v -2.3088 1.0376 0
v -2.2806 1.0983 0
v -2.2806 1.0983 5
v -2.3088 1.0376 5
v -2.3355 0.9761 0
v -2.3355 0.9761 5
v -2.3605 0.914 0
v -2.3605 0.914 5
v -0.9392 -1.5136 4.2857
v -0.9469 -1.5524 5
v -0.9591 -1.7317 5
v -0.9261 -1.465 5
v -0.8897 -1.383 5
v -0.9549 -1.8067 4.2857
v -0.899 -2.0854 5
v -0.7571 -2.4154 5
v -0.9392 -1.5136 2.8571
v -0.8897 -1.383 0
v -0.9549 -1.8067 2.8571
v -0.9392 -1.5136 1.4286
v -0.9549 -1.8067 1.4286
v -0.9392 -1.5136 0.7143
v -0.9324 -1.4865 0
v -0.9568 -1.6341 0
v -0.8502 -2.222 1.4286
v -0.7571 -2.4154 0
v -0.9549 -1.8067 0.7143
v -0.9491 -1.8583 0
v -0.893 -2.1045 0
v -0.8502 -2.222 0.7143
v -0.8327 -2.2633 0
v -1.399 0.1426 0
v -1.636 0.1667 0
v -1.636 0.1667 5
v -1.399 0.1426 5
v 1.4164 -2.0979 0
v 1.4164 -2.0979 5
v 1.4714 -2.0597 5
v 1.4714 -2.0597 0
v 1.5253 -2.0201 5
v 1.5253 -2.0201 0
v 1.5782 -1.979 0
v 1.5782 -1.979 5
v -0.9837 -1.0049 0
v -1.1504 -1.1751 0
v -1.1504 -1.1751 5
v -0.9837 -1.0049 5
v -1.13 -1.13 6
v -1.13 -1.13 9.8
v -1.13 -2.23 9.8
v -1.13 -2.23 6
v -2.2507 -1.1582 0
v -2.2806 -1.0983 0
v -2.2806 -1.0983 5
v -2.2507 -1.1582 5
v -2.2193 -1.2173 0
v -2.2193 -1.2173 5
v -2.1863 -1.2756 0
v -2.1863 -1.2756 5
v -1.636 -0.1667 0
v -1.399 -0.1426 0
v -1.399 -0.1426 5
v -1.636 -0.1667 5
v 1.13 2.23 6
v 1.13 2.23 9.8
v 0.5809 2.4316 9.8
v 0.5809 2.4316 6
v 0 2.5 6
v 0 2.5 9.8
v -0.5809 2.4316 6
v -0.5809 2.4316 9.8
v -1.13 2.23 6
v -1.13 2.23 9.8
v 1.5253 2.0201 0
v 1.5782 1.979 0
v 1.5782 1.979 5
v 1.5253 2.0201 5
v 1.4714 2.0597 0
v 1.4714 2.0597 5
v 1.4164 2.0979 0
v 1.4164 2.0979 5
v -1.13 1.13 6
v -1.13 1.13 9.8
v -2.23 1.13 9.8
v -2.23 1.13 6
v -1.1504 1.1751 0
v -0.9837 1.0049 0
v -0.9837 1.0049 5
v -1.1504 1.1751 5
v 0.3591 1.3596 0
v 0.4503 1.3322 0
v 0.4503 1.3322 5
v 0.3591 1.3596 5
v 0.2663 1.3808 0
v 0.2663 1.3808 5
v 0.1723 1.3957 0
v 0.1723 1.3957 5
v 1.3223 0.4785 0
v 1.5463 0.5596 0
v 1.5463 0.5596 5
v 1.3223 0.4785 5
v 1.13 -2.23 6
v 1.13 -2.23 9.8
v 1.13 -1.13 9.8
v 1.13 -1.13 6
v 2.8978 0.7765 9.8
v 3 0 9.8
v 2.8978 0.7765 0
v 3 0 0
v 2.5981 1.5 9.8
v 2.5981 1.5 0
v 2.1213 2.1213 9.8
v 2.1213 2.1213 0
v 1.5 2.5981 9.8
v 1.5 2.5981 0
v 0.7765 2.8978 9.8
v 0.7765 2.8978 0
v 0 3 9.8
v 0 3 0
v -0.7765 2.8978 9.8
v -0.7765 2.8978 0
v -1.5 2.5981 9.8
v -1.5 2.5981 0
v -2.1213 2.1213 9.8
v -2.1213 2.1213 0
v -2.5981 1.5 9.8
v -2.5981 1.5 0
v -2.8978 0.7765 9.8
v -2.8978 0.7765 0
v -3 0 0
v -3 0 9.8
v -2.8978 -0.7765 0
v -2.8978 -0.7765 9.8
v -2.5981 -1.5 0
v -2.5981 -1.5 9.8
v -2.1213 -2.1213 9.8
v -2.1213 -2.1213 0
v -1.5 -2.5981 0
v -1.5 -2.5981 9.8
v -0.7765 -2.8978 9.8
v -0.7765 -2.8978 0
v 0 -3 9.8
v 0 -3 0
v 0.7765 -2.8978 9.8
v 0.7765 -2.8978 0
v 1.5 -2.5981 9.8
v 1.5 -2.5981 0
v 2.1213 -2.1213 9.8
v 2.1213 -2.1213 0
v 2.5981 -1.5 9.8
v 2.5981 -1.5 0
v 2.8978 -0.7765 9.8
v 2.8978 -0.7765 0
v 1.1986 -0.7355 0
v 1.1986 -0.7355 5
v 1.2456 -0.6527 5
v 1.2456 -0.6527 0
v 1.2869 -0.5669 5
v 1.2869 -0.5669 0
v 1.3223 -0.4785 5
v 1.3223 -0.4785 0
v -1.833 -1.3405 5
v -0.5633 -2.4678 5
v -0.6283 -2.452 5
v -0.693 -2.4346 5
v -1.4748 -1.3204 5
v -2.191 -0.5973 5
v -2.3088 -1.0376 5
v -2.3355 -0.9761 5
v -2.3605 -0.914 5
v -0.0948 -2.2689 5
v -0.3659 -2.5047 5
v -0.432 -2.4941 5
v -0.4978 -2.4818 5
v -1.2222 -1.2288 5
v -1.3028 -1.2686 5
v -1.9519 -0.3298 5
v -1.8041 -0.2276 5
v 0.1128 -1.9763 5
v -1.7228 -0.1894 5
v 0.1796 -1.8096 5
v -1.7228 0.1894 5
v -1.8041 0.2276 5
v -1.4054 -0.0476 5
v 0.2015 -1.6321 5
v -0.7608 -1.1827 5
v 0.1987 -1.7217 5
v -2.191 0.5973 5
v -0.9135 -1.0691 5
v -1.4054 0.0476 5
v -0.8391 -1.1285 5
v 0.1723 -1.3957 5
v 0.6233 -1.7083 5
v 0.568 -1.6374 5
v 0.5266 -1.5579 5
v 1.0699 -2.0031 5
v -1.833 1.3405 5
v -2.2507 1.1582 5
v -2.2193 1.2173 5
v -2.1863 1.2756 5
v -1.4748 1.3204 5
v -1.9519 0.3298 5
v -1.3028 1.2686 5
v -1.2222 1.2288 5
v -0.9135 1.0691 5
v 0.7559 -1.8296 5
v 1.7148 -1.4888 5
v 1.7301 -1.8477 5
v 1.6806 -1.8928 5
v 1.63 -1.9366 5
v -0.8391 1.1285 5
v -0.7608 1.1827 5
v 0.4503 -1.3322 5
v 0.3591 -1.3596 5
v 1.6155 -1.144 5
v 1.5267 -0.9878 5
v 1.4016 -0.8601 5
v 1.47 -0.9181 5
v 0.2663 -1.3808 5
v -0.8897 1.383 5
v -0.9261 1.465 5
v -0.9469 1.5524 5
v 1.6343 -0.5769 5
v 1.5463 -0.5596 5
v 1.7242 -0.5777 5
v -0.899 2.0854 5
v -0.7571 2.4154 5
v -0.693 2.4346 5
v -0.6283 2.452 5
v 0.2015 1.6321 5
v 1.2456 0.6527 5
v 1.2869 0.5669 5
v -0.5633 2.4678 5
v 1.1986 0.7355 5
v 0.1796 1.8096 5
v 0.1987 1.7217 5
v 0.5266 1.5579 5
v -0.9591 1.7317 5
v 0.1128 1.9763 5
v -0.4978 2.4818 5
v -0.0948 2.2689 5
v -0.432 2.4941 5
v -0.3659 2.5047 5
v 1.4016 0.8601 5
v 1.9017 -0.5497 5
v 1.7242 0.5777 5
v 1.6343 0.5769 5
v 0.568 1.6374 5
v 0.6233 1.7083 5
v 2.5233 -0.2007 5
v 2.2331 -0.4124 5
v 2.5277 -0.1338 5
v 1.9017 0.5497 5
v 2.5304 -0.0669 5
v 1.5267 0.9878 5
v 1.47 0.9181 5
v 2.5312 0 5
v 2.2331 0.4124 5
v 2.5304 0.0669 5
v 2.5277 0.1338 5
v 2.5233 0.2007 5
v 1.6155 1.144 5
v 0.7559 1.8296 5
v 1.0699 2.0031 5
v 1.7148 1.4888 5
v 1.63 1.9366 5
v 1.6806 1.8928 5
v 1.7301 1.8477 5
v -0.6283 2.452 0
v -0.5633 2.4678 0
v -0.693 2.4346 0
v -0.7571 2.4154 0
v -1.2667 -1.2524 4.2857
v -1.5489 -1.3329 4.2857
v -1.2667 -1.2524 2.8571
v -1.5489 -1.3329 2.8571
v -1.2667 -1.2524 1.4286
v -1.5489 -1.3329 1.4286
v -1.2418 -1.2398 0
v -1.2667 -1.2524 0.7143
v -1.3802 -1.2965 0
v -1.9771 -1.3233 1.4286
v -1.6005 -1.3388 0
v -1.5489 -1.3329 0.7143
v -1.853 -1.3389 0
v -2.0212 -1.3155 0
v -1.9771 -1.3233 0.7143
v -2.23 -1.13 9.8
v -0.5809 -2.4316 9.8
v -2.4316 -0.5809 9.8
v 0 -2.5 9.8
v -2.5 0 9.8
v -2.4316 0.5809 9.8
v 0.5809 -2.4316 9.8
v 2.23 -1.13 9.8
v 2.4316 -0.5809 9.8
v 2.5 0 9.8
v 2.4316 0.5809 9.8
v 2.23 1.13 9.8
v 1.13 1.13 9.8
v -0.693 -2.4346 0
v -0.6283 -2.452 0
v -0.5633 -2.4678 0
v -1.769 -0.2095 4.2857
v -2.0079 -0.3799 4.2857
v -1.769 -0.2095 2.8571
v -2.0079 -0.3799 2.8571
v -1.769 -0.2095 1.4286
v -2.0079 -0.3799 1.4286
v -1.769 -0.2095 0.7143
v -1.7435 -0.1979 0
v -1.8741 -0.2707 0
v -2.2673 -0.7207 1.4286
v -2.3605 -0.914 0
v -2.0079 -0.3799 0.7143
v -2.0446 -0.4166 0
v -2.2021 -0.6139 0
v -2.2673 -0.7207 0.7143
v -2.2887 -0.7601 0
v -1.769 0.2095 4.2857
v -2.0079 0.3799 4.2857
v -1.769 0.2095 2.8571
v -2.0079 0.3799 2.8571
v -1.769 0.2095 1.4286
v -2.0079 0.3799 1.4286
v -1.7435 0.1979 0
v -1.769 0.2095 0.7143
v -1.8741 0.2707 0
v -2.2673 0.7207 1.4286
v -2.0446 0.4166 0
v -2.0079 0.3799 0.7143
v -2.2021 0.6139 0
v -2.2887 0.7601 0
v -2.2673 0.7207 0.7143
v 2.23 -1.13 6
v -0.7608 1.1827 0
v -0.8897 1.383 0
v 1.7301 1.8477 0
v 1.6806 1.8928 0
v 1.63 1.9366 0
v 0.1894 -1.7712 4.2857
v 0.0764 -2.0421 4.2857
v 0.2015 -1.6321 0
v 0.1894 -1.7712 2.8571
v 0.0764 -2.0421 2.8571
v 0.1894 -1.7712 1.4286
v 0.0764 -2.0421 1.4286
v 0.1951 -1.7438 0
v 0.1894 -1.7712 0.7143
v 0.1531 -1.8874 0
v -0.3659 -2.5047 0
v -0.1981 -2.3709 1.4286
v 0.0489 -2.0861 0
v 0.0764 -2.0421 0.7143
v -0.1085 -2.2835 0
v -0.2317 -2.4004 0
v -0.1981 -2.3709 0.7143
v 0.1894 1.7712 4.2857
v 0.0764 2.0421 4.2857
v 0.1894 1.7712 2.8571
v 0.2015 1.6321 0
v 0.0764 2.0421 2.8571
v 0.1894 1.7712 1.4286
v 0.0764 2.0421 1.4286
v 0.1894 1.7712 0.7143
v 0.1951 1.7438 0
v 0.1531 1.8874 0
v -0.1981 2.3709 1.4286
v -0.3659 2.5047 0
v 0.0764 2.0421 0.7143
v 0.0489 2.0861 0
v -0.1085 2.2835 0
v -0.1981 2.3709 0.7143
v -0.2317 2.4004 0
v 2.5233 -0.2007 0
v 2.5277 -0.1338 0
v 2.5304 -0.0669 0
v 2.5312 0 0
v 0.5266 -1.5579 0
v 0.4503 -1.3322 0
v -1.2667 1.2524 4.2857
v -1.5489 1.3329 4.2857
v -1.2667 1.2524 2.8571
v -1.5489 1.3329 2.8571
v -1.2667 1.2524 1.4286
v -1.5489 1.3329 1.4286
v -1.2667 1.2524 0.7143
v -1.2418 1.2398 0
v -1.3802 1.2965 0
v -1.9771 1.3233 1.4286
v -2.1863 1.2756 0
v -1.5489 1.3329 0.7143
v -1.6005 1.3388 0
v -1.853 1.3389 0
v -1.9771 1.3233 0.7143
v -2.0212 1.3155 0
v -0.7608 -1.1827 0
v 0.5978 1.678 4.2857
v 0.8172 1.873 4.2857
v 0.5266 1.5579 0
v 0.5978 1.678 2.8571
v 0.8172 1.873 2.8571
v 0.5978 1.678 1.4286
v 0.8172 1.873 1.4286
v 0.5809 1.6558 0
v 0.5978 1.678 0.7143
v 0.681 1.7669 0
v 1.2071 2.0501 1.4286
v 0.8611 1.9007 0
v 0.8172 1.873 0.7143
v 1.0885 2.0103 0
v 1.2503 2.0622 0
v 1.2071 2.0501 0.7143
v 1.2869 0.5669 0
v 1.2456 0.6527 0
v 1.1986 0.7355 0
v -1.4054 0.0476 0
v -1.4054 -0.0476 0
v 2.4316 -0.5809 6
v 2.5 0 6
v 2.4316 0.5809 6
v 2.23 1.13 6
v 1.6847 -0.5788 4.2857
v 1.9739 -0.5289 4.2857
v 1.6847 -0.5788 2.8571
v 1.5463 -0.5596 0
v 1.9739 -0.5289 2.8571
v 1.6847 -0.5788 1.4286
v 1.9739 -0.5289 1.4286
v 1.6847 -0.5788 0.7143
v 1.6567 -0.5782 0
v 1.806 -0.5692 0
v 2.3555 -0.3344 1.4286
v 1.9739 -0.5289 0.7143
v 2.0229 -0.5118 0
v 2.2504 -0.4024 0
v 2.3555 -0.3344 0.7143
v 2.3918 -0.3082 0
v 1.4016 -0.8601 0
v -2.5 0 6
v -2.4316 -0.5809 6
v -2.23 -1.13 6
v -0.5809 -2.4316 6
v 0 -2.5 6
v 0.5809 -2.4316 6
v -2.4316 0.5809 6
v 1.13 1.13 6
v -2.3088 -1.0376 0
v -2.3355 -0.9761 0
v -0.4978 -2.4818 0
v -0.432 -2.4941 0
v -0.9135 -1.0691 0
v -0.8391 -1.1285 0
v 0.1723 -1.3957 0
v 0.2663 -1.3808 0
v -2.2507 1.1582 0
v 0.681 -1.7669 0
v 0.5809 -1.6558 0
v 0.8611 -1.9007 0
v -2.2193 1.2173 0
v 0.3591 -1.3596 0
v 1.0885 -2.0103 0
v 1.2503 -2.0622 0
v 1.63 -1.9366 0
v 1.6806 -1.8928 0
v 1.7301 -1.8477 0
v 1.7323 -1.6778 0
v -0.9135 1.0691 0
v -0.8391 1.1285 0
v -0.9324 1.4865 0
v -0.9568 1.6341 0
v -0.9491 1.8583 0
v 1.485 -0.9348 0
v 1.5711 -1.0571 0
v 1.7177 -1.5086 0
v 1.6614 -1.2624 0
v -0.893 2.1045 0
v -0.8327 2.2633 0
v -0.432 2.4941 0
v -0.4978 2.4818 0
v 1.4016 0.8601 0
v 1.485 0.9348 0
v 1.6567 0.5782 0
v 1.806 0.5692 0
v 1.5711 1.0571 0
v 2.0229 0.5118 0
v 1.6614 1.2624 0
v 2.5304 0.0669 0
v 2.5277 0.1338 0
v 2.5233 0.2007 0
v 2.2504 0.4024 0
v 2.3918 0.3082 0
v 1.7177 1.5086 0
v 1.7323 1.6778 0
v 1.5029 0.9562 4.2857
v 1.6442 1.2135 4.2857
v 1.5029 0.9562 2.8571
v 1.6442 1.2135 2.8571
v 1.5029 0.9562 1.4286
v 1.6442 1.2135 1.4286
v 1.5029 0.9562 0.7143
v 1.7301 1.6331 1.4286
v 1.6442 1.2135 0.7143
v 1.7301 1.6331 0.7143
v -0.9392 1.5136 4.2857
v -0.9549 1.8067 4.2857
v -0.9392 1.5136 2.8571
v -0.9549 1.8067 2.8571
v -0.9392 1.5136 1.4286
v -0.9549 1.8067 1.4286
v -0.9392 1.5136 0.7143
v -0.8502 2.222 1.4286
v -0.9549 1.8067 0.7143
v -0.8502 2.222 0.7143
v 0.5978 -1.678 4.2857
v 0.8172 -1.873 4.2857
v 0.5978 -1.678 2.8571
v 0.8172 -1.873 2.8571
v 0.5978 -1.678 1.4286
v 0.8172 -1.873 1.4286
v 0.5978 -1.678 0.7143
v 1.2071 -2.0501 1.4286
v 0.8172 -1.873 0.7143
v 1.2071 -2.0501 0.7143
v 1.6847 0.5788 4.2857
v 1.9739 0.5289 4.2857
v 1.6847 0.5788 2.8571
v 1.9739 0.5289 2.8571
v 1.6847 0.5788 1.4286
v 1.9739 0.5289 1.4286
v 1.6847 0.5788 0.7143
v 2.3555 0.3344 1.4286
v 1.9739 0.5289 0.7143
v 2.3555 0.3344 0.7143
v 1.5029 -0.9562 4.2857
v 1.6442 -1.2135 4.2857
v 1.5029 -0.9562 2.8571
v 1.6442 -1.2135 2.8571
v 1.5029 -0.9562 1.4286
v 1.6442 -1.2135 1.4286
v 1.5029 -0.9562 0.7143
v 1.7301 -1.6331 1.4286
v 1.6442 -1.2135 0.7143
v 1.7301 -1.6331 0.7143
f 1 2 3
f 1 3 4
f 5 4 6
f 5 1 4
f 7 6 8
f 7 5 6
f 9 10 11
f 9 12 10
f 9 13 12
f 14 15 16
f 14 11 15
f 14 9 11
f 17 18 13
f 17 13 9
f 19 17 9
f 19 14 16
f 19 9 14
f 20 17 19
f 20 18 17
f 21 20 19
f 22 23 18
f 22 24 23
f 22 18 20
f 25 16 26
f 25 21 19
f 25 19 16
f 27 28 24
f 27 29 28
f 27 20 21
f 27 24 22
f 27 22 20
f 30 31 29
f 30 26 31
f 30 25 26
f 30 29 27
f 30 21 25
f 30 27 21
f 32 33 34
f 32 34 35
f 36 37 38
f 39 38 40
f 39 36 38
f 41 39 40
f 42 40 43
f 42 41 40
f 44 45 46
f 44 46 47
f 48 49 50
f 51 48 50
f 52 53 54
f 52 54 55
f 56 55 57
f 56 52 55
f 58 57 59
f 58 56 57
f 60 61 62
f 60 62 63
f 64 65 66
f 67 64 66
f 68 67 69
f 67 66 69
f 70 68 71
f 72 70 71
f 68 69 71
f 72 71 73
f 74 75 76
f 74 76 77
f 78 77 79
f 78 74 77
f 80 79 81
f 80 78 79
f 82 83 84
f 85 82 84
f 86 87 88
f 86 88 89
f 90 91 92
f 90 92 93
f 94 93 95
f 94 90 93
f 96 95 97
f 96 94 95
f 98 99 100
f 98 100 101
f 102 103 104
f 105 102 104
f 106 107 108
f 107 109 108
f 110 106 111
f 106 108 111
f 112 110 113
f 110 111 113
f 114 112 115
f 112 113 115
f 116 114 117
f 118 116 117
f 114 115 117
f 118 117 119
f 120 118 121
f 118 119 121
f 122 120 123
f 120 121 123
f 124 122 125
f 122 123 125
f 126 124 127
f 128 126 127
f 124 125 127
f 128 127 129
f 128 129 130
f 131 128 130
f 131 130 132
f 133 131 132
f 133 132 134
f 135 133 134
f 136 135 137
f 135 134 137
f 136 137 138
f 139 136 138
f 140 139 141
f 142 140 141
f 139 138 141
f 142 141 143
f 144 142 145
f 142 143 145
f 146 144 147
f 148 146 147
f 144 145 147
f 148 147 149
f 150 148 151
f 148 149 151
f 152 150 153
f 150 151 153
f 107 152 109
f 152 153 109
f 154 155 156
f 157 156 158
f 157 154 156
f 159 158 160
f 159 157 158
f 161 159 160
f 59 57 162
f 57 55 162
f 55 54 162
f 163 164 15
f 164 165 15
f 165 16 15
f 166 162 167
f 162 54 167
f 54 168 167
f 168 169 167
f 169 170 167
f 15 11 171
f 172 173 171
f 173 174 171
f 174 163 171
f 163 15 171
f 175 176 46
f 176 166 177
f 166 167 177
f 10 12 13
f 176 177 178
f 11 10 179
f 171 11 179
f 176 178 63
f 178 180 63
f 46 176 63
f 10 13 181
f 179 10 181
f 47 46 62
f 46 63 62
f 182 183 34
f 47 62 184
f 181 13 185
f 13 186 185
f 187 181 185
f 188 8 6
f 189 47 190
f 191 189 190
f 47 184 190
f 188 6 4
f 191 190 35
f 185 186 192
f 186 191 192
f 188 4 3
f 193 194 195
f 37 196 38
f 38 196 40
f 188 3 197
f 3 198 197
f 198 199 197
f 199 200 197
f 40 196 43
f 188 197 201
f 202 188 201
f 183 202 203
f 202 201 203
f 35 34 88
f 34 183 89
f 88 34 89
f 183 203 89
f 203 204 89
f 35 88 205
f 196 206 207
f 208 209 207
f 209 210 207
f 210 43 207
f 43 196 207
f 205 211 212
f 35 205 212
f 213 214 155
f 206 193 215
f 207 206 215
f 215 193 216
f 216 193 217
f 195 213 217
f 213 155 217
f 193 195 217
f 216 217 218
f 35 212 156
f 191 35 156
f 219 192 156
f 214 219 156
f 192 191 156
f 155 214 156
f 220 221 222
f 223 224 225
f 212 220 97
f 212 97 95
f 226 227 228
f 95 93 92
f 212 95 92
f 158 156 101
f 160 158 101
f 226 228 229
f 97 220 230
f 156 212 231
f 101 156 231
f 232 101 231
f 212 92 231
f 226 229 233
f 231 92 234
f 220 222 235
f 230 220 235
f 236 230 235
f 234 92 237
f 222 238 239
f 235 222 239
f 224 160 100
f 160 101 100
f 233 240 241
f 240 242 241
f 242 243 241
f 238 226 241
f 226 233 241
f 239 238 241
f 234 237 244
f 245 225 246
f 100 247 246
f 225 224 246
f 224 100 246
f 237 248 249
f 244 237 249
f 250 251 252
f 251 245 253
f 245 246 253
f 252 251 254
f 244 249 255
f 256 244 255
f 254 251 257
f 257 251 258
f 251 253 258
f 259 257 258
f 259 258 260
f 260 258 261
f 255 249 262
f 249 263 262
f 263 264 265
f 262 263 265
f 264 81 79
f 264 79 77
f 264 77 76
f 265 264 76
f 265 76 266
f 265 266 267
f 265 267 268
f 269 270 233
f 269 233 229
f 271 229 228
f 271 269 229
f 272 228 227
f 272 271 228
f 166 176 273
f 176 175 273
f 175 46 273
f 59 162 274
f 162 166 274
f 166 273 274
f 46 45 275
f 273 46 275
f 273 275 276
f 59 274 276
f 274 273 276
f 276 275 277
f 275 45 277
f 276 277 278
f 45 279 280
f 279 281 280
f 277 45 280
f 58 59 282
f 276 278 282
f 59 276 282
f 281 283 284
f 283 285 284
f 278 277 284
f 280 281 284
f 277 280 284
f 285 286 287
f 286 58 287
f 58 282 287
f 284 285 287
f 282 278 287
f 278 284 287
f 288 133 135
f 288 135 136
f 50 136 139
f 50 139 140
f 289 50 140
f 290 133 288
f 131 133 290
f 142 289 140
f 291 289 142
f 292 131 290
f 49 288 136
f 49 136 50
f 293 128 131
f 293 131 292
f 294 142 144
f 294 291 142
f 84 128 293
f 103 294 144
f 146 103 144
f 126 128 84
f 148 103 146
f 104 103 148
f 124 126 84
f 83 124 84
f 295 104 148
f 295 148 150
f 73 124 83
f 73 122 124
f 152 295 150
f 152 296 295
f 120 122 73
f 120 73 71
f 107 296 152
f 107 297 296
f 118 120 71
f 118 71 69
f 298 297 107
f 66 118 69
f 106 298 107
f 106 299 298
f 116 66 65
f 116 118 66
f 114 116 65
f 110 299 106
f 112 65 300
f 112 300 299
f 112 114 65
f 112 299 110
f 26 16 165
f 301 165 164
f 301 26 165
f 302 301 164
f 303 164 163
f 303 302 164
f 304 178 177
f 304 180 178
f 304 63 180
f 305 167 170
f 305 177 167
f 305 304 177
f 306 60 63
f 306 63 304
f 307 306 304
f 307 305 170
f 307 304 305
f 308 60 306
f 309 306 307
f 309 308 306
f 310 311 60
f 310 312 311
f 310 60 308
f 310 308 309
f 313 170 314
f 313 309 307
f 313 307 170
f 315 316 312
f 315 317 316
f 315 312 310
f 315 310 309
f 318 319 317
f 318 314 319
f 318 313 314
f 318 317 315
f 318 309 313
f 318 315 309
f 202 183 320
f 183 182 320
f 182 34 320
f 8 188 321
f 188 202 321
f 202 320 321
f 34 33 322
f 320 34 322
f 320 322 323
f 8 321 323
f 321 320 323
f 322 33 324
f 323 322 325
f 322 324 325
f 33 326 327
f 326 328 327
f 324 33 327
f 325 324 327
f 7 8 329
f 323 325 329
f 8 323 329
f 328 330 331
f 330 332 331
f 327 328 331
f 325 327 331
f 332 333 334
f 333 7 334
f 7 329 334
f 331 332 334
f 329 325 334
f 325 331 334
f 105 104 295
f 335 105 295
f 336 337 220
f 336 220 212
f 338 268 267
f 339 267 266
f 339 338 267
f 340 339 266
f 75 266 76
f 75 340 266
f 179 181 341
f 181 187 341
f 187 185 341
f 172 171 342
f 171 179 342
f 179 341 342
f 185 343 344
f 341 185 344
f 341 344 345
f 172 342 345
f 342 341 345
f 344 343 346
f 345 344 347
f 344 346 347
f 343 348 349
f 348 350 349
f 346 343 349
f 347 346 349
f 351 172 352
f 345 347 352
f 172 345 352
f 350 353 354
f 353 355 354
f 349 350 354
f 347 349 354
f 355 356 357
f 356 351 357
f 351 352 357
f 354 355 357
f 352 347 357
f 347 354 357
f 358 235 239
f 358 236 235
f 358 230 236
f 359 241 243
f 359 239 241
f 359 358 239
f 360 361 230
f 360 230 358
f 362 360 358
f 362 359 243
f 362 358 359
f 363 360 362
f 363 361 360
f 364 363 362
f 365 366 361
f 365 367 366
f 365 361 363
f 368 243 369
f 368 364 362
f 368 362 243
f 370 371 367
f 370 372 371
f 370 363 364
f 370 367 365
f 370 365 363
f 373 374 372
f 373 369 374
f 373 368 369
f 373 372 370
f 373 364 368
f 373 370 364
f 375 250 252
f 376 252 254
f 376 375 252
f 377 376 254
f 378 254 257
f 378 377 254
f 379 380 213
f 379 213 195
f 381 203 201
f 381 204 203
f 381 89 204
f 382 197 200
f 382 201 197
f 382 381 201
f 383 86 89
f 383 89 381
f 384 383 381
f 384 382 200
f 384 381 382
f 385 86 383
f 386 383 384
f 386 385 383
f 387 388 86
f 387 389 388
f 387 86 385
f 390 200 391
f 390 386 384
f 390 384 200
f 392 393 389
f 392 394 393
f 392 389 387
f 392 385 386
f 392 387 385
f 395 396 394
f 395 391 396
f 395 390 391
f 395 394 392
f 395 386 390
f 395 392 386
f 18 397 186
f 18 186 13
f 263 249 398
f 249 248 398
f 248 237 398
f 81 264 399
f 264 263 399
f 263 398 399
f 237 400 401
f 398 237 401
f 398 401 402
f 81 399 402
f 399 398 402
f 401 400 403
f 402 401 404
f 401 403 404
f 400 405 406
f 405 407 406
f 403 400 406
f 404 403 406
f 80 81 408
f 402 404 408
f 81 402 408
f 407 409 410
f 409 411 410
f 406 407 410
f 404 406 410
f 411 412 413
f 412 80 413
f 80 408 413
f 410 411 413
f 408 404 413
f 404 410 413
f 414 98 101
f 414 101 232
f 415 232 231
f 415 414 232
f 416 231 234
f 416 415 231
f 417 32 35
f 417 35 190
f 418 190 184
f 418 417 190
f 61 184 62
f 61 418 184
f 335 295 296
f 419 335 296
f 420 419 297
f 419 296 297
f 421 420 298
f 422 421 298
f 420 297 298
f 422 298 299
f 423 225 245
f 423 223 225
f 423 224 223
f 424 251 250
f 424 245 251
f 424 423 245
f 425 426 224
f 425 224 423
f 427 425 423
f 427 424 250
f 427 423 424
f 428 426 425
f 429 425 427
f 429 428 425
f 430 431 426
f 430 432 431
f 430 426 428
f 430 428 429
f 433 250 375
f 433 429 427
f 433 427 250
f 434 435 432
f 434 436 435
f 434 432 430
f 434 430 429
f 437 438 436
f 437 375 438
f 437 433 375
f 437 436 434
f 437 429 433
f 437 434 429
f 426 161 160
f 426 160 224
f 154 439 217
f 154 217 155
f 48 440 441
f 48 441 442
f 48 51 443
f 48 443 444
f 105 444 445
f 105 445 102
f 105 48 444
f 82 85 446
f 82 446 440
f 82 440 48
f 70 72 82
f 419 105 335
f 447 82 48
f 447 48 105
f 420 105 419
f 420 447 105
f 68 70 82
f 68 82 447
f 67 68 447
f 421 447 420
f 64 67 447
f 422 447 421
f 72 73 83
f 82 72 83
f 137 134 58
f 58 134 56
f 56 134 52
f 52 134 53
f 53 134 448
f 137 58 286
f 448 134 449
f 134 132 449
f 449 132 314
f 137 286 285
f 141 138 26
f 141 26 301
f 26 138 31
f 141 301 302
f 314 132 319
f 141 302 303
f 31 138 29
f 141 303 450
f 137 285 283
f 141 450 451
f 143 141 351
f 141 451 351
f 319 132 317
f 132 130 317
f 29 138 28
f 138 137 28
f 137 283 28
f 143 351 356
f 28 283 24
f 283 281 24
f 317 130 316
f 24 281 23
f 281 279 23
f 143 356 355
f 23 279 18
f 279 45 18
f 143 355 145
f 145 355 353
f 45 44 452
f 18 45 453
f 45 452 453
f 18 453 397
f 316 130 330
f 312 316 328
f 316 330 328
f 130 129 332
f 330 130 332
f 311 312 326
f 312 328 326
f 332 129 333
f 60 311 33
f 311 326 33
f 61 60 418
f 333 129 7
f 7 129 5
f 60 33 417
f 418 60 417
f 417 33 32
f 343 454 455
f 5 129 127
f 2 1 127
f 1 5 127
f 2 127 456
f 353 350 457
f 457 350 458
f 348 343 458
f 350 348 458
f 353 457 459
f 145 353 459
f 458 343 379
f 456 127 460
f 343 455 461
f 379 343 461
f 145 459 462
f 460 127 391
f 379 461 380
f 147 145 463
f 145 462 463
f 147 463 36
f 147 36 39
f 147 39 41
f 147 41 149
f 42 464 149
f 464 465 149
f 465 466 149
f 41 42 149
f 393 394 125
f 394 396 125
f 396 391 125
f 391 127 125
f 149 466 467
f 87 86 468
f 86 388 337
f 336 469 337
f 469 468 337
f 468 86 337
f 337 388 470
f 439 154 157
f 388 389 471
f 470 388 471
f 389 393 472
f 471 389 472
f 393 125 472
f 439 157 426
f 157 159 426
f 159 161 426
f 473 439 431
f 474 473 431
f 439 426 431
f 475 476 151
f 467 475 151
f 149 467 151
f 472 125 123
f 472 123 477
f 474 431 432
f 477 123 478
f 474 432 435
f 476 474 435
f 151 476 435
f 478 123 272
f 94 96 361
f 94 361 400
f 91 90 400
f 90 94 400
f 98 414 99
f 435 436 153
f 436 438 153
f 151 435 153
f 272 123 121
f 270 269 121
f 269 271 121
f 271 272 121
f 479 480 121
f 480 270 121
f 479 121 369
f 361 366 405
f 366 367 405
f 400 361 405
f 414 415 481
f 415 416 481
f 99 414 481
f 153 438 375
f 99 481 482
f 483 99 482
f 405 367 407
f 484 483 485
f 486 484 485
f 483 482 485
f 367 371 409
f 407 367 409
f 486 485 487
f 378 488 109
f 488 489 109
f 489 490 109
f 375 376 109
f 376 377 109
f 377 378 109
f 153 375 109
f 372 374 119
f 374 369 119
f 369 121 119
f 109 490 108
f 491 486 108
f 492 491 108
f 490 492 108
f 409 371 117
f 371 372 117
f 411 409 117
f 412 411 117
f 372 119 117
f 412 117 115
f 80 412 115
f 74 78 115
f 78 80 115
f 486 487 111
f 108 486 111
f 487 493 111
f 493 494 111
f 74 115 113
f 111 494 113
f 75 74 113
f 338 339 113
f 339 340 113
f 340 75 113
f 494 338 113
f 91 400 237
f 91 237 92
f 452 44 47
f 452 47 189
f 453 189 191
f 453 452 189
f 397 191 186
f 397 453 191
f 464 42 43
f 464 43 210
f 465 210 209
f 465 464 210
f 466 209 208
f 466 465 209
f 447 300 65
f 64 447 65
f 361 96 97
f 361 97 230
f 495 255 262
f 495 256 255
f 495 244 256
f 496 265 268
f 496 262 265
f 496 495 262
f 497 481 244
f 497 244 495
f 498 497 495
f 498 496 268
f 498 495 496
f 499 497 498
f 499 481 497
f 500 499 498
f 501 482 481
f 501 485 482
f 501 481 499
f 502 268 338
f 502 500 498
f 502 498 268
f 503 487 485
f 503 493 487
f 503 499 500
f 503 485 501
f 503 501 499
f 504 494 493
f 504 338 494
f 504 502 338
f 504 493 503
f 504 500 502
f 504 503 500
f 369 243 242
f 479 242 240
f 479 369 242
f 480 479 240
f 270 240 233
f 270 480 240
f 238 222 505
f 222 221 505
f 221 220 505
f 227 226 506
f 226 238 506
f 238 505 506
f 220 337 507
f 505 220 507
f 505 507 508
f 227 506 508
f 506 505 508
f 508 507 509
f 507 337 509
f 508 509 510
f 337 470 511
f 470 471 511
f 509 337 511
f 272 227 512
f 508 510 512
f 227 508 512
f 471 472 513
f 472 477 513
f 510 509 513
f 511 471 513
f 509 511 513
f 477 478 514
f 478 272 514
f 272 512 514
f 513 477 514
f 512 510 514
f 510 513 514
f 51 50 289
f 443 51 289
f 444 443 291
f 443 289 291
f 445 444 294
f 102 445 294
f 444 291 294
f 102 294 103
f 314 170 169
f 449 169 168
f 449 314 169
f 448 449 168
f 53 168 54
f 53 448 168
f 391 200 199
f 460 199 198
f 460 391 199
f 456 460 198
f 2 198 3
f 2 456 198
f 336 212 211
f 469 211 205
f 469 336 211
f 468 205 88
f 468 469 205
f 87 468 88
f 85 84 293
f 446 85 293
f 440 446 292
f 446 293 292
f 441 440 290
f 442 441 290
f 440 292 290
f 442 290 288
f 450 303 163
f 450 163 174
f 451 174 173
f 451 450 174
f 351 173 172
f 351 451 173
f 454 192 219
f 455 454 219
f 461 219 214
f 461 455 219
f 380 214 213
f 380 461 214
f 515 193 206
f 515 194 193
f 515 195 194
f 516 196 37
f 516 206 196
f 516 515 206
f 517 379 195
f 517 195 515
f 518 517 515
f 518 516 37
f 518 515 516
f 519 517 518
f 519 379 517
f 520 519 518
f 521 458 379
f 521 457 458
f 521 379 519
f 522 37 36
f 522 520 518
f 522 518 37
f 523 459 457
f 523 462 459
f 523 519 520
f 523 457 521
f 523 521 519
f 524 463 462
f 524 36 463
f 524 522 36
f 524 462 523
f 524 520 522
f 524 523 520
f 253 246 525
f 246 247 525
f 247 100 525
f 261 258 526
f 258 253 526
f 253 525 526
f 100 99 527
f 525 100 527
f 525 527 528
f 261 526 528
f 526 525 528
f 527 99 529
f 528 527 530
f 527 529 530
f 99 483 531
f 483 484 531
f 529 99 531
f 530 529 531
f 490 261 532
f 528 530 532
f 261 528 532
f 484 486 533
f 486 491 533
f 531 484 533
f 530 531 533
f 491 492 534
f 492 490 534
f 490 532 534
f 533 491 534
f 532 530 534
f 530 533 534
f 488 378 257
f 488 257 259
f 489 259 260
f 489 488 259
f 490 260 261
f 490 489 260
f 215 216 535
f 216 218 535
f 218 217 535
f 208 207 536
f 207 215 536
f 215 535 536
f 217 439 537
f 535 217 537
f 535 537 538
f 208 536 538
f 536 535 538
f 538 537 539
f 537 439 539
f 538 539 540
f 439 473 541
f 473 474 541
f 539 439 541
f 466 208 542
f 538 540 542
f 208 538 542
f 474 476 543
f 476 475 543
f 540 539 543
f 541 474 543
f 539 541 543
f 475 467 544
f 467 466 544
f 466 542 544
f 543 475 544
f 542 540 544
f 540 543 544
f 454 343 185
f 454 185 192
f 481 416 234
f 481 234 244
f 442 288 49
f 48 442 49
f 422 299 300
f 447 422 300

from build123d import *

# Parameters (mm, degrees)
SKETCH_1_R               = 3
SKETCH_1_R_2             = 1.40625
EXTRUDE_1_DEPTH          = 5
CUT_EXTRUDE_2_DEPTH      = 7.557438524
PATTERN_CIRCULAR_1_COUNT = 7
SKETCH_2_R               = 3
EXTRUDE_2_DEPTH          = 4.8
CUT_EXTRUDE_START        = 4.8
CUT_EXTRUDE_3_DEPTH      = 3.8


with BuildPart() as part:
    # 草图1 → 凸台-拉伸1 (new body)
    with BuildSketch(Plane.XY):
        Circle(SKETCH_1_R)
        Circle(SKETCH_1_R_2, mode=Mode.SUBTRACT)
    extrude(amount=EXTRUDE_1_DEPTH)

    # 草图1<3> → 切除-拉伸2 (cut, through all)
    with BuildSketch(Plane.XY):
        with BuildLine():
            Line((1.546319716, 0.559598866), (1.322324253, 0.478536971))
            ThreePointArc((1.322324253, 0.478536971), (1.385109661, 0.242920339), (1.40625, 0))
            ThreePointArc((1.40625, 0), (1.385109661, -0.242920339), (1.322324253, -0.478536971))
            Line((1.322324253, -0.478536971), (1.546319716, -0.559598866))
            add(Edge.make_bspline(
                [(1.546319716, -0.559598866), (1.558105463, -0.563864019), (1.591921474, -0.573215837), (1.658734166, -0.580959295), (1.767731952, -0.57845396), (1.907008009, -0.553308364), (2.079413065, -0.496026363), (2.261035814, -0.40341458), (2.393734523, -0.311147352), (2.48335867, -0.236539754), (2.523284743, -0.200650618)],
                knots=[0, 0, 0, 0, 0, 0.005604068, 0.015718248, 0.029959916, 0.048733667, 0.068727063, 0.096888892, 0.120945025, 0.120945025, 0.120945025, 0.120945025, 0.120945025], degree=4))
            ThreePointArc((2.523284743, -0.200650618), (2.529257902, -0.100404327), (2.53125, 0))
            ThreePointArc((2.53125, 0), (2.529257902, 0.100404327), (2.523284743, 0.200650618))
            add(Edge.make_bspline(
                [(1.546319716, 0.559598866), (1.558105463, 0.563864019), (1.591921474, 0.573215837), (1.658734166, 0.580959295), (1.767731952, 0.57845396), (1.907008009, 0.553308364), (2.079413065, 0.496026363), (2.261035814, 0.40341458), (2.393734523, 0.311147352), (2.48335867, 0.236539754), (2.523284743, 0.200650618)],
                knots=[0, 0, 0, 0, 0, 0.005604068, 0.015718248, 0.029959916, 0.048733667, 0.068727063, 0.096888892, 0.120945025, 0.120945025, 0.120945025, 0.120945025, 0.120945025], degree=4))
        make_face()
    cut_extrude_2 = extrude(amount=CUT_EXTRUDE_2_DEPTH, mode=Mode.SUBTRACT)

    # 阵列(圆周)1: 切除-拉伸2 ×7 about axis
    pattern_circular_1_axis = Axis((0, 0, 5), (0, 0, 1))
    for i in range(1, PATTERN_CIRCULAR_1_COUNT):
        add(cut_extrude_2.rotate(pattern_circular_1_axis, i * 360 / PATTERN_CIRCULAR_1_COUNT), mode=Mode.SUBTRACT)

    # 草图2 → 凸台-拉伸2 (add)
    with BuildSketch(Plane.XY.offset(5)):
        Circle(SKETCH_2_R)
    extrude(amount=EXTRUDE_2_DEPTH)

    # 草图2<4> → 切除-拉伸3 (cut)
    with BuildSketch(Plane.XY.offset(5).offset(CUT_EXTRUDE_START)):
        with BuildLine():
            ThreePointArc((1.130029762, 2.230029762), (0, 2.5), (-1.130029762, 2.230029762))
            Line((-1.130029762, 2.230029762), (-1.130029762, 1.130029762))
            Line((-1.130029762, 1.130029762), (-2.230029762, 1.130029762))
            ThreePointArc((-2.230029762, 1.130029762), (-2.5, 0), (-2.230029762, -1.130029762))
            Line((-2.230029762, -1.130029762), (-1.130029762, -1.130029762))
            Line((-1.130029762, -1.130029762), (-1.130029762, -2.230029762))
            ThreePointArc((-1.130029762, -2.230029762), (0, -2.5), (1.130029762, -2.230029762))
            Line((1.130029762, -2.230029762), (1.130029762, -1.130029762))
            Line((1.130029762, -1.130029762), (2.230029762, -1.130029762))
            ThreePointArc((2.230029762, -1.130029762), (2.5, 0), (2.230029762, 1.130029762))
            Line((2.230029762, 1.130029762), (1.130029762, 1.130029762))
            Line((1.130029762, 1.130029762), (1.130029762, 2.230029762))
        make_face()
    extrude(amount=-CUT_EXTRUDE_3_DEPTH, mode=Mode.SUBTRACT)


solid = part.part
